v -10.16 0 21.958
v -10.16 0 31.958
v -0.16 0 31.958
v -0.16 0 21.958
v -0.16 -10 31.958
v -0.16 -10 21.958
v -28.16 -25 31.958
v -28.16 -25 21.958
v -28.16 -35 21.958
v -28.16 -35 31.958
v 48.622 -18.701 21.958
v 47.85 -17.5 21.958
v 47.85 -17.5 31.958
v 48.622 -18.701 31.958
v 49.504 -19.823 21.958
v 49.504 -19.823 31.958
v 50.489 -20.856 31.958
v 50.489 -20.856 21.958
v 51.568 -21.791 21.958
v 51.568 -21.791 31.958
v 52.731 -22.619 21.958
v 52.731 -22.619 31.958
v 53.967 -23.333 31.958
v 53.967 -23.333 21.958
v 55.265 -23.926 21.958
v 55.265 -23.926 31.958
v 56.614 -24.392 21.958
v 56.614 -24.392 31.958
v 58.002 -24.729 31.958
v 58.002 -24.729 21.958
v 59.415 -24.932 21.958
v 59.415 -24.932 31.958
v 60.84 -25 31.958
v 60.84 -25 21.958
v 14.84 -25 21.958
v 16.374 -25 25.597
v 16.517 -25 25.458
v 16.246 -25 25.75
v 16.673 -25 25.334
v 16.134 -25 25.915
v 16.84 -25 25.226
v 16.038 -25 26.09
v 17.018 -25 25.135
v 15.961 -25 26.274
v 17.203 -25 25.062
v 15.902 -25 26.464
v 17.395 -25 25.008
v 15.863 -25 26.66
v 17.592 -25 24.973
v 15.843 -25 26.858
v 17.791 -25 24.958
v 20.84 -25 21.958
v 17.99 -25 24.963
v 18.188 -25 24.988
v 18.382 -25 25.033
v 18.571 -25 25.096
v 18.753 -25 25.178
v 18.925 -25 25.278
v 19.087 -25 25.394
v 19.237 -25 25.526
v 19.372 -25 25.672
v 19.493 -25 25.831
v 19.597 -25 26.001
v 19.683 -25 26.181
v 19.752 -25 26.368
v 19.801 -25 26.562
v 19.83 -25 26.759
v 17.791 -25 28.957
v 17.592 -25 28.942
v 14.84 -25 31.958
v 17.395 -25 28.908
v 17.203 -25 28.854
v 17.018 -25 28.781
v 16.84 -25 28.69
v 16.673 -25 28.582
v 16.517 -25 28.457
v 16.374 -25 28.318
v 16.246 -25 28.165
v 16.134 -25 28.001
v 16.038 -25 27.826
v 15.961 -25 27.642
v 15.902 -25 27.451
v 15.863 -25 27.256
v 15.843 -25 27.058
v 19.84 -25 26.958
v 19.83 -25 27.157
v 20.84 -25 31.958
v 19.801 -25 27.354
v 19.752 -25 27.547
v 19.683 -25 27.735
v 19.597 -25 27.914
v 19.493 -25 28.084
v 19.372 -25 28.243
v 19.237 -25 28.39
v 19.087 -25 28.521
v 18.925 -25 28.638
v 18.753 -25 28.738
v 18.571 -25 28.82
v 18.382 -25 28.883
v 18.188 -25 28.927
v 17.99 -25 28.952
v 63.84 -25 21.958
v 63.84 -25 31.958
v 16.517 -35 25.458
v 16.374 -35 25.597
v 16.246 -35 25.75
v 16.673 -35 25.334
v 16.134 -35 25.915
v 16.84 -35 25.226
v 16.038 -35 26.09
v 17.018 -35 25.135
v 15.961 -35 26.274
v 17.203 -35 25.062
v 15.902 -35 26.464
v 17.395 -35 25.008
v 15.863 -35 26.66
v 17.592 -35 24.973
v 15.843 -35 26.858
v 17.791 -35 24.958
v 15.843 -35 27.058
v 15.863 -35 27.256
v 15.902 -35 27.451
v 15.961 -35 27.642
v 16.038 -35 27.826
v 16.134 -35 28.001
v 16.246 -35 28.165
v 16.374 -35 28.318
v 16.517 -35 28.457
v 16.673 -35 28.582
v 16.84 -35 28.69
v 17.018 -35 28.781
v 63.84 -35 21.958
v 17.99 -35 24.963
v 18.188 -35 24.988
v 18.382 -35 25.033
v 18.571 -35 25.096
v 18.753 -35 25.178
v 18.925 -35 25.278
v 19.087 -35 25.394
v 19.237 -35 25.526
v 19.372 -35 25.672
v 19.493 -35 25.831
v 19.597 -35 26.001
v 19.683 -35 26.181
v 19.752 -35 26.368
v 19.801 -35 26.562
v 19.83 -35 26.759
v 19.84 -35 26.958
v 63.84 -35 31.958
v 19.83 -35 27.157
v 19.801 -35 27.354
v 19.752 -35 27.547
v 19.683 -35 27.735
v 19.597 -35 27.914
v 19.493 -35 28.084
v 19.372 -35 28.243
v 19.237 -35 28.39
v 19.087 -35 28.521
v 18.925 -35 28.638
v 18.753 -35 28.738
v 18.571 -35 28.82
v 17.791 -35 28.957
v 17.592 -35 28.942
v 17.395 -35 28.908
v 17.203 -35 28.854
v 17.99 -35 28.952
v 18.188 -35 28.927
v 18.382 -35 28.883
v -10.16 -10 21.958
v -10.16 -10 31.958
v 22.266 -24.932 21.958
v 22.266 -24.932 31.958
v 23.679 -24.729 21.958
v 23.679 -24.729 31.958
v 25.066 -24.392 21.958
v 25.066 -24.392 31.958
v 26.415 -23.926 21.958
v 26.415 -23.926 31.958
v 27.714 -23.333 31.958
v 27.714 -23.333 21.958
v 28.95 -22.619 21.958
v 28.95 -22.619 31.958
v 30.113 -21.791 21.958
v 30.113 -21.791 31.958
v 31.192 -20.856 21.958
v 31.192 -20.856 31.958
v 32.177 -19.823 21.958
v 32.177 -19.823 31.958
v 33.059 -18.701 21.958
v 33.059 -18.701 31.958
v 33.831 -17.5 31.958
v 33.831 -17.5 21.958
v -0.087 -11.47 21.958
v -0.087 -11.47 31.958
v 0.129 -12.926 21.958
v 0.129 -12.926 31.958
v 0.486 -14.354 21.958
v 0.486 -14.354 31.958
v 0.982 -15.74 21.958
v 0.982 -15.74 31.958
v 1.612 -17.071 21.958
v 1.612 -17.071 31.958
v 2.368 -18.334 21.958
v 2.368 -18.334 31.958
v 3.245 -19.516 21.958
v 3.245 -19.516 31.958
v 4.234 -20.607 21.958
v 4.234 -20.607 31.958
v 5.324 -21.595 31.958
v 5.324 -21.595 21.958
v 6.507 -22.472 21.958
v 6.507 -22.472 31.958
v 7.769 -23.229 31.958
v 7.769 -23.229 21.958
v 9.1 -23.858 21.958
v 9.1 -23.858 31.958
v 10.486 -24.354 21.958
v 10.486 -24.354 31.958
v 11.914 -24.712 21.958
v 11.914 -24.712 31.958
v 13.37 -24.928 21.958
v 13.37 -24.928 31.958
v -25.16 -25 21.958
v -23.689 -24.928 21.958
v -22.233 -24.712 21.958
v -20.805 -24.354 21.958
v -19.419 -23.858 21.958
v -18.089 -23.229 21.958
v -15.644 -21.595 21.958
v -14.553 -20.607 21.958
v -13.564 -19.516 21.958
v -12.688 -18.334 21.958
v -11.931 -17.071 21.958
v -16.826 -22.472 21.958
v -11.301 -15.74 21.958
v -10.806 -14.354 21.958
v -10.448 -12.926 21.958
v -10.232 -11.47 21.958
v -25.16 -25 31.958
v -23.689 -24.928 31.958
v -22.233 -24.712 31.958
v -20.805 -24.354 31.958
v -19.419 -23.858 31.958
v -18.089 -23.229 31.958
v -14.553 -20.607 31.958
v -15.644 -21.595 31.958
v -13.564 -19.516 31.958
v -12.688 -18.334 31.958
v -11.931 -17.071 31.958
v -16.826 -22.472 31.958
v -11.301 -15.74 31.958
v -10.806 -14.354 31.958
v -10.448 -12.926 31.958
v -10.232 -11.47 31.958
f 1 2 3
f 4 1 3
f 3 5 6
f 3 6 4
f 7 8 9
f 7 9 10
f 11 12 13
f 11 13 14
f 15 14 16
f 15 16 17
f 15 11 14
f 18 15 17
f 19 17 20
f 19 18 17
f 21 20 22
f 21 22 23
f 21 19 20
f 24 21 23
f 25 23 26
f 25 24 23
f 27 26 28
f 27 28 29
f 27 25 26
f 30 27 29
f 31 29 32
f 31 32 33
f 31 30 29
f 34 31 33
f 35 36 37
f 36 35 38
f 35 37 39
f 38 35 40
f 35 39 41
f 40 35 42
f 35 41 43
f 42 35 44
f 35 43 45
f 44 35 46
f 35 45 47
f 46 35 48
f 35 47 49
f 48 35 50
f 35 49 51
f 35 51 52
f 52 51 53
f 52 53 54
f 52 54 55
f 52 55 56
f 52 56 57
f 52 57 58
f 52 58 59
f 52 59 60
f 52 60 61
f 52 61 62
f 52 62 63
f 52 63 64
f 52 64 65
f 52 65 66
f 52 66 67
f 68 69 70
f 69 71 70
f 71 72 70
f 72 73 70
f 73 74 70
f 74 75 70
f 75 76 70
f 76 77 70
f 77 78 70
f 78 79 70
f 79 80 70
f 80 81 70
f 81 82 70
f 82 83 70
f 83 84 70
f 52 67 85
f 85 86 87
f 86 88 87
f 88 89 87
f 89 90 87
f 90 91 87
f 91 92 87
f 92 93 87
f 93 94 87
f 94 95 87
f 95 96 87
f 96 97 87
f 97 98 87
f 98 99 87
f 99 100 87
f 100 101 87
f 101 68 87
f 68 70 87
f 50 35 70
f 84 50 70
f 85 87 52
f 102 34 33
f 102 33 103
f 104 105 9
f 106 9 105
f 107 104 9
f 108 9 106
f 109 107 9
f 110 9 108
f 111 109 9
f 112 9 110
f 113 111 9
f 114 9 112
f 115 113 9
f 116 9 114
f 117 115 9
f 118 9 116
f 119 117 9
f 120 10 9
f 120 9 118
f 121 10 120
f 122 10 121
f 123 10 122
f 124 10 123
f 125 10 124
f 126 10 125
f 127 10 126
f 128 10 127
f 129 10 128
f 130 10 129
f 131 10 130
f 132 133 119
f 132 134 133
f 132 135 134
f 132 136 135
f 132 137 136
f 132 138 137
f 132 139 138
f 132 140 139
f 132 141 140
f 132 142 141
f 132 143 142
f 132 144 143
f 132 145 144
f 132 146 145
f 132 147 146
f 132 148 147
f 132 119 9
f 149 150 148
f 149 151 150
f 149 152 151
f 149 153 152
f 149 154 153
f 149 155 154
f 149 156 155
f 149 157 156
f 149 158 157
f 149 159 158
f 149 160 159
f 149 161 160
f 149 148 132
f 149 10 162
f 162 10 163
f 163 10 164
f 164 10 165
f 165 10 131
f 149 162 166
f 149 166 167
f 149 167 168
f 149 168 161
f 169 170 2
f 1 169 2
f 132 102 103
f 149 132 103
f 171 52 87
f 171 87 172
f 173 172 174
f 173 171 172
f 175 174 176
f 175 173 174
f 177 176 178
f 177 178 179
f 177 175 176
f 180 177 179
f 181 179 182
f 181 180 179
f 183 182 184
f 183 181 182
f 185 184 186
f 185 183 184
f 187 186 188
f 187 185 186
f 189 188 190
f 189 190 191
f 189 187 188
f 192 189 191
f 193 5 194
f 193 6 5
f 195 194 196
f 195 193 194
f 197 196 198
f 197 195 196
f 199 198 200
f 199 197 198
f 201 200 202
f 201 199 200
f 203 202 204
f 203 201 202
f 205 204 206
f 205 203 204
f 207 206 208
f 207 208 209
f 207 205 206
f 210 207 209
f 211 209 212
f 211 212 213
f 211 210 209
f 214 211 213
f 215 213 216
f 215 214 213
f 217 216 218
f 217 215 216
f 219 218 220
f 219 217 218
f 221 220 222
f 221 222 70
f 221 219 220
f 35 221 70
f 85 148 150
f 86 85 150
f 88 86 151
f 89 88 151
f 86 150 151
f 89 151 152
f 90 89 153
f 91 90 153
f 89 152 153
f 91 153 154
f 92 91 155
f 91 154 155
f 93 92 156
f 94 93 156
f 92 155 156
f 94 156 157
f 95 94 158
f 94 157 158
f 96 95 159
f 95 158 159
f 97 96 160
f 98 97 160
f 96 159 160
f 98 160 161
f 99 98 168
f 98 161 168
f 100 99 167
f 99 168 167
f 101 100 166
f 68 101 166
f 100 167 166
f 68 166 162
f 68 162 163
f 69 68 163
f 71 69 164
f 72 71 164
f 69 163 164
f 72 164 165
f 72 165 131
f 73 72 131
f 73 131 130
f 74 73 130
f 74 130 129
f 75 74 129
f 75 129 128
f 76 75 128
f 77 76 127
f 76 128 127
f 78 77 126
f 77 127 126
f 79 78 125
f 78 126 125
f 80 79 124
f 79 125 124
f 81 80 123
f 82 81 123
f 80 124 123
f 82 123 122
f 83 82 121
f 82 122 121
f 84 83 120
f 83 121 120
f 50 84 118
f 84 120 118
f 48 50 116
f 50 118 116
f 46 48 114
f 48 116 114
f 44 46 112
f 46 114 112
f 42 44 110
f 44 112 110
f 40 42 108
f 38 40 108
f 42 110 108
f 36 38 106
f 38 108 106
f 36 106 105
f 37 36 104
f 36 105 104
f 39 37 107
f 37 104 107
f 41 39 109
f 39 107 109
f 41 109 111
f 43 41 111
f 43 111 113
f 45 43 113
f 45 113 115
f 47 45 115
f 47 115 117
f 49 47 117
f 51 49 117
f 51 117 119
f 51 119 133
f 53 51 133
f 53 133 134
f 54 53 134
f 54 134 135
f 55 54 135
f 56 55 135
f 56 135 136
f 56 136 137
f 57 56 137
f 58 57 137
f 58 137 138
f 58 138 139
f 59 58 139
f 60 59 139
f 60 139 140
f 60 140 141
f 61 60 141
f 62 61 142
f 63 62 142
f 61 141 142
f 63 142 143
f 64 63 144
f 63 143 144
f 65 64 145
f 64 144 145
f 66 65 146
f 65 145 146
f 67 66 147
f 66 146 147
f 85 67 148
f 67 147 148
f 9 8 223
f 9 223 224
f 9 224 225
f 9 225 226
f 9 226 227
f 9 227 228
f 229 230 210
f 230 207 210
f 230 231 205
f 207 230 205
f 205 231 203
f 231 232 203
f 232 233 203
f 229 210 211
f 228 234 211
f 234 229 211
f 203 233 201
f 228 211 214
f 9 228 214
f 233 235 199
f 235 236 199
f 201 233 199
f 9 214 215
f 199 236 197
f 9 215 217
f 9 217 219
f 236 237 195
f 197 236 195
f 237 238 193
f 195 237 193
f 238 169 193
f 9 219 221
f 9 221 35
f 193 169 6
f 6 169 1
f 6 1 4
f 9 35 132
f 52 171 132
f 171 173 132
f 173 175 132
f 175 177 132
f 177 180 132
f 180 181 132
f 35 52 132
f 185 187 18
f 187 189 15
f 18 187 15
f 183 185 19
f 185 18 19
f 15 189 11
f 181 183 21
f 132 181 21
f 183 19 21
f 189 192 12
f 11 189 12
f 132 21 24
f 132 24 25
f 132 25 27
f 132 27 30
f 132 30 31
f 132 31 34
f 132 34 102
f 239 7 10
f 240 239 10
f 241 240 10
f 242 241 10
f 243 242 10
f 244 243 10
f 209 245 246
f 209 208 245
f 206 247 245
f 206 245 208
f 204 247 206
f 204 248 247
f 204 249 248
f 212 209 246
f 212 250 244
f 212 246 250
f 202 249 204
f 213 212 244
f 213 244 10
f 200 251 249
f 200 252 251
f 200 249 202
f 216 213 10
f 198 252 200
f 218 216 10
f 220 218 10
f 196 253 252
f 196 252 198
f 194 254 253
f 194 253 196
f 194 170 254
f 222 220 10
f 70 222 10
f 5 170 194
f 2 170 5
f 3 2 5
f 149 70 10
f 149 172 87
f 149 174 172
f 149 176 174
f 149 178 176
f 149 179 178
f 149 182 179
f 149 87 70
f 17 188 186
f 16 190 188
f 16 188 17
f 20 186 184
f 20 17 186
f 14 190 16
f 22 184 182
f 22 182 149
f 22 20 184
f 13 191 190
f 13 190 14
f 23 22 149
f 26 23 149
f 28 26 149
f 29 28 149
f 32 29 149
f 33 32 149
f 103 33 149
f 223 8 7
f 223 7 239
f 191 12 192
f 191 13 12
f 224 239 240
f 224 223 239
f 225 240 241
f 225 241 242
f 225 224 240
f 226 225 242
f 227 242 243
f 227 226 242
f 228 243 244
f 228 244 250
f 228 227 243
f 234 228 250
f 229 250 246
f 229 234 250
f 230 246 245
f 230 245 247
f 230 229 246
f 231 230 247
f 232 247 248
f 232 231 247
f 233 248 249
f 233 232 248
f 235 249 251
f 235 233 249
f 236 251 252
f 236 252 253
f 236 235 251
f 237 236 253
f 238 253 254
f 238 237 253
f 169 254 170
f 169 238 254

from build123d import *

# Parameters (mm, degrees)
F0_W     = 92
F0_H     = 10
F1_DEPTH = 35
F2_W     = 18
F2_H     = 25
F2_W_2   = 36
F3_DEPTH = 10
F4_R     = 2
F5_DEPTH = 10
F6_R     = 15
F7_W     = 10
F7_H     = 10
F7_W_2   = 4.897156
F7_W_3   = 5.102844
F8_DEPTH = 17.5


with BuildPart() as f1:
    # F0 (on Front) → F1 (new body)
    with BuildSketch(Plane.XZ):
        with Locations((17.840367, 26.957831)):
            Rectangle(F0_W, F0_H)
    extrude(amount=F1_DEPTH)

    # F2 (on face) → F3 (cut)
    with BuildSketch(Plane.XY.offset(31.957831)):
        with Locations((-19.159633, -12.5)):
            Rectangle(F2_W, F2_H)
        with Locations((17.840367, -12.5)):
            Rectangle(F2_W_2, F2_H)
        with Locations((54.840367, -12.5)):
            Rectangle(F2_W, F2_H)
    extrude(amount=-F3_DEPTH, mode=Mode.SUBTRACT)

    # F4 (on face) → F5 (cut)
    with BuildSketch(Plane.XZ.offset(35)):
        with Locations((17.840367, 26.957831)):
            Circle(F4_R)
    extrude(amount=-F5_DEPTH, mode=Mode.SUBTRACT)

    # F6
    f6_edges = [f1.edges().sort_by_distance(p)[0] for p in [
        (-0.159633, -25, 26.957831),
        (45.840367, -25, 26.957831),
        (35.840367, -25, 26.957831),
        (-10.159633, -25, 26.957831),
    ]]
    fillet(f6_edges, radius=F6_R)

    # F7 (on face) → F8 (cut)
    with BuildSketch(Plane(origin=(0, 0, 0), x_dir=(-1, 0, 0), z_dir=(0, 1, 0))):
        with Locations((-40.840367, 26.957831)):
            Rectangle(F7_W, F7_H)
        with Locations((-33.391789, 26.957831)):
            Rectangle(F7_W_2, F7_H)
        with Locations((-48.391789, 26.957831)):
            Rectangle(F7_W_3, F7_H)
    extrude(amount=-F8_DEPTH, mode=Mode.SUBTRACT)


solid = f1.part
